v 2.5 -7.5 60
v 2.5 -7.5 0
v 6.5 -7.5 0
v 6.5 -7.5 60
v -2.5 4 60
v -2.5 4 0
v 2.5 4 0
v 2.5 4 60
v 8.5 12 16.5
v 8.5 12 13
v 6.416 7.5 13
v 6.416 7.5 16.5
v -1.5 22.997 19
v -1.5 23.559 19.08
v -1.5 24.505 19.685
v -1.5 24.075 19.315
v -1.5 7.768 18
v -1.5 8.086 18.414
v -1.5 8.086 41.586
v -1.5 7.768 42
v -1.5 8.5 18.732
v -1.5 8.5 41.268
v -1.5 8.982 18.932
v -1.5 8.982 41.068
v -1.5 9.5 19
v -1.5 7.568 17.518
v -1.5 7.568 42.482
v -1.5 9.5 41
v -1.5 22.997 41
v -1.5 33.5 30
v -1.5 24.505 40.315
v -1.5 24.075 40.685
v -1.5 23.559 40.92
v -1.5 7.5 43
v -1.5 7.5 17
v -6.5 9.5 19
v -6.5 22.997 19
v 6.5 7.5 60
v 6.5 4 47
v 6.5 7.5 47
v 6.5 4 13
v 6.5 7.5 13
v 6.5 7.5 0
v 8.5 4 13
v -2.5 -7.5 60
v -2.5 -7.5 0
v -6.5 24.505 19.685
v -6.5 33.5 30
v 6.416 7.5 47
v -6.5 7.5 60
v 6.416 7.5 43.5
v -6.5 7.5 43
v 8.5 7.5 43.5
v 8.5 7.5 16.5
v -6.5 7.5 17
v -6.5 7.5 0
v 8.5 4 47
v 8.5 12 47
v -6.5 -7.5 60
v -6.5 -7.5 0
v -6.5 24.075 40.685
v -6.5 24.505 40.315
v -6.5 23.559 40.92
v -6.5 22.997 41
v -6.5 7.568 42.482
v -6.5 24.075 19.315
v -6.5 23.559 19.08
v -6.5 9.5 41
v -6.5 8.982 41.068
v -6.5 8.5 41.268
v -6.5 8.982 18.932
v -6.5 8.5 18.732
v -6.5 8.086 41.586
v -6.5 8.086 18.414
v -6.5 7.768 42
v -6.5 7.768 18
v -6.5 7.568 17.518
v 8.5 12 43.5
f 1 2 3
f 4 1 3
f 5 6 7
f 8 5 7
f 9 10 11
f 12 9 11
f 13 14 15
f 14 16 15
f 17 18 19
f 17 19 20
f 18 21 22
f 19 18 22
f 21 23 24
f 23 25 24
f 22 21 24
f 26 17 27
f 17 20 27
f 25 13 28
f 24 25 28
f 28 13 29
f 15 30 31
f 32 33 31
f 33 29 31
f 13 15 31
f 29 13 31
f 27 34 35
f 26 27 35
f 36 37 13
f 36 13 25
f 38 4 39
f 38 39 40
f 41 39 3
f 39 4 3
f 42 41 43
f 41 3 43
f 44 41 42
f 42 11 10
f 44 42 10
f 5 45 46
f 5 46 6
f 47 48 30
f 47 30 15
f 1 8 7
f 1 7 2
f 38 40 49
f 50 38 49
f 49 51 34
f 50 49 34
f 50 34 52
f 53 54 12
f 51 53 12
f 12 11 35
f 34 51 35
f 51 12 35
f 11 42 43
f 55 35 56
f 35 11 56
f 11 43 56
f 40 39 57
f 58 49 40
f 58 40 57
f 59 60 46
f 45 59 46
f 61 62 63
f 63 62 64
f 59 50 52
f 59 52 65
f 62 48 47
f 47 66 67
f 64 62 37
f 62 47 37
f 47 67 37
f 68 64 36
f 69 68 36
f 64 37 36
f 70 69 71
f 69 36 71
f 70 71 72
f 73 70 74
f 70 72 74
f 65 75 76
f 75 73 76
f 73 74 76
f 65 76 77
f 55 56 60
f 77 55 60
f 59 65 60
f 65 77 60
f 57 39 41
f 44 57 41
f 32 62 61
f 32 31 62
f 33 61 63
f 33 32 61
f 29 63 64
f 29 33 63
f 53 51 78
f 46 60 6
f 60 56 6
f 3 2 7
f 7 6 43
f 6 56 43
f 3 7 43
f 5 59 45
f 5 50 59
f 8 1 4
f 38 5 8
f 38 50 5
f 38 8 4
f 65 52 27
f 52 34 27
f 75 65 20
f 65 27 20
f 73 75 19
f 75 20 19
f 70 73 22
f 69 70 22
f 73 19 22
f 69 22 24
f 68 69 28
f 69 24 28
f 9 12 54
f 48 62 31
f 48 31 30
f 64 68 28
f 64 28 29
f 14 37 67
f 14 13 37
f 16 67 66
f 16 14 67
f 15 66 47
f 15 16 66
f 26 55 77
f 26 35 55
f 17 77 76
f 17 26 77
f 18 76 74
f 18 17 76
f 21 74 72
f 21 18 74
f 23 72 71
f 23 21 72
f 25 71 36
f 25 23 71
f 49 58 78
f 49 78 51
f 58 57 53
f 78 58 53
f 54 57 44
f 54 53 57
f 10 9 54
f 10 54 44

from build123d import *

# Parameters (mm, degrees)
EXTRUDE_1_DEPTH = 60
EXTRUDE_2_DEPTH = 5
SKETCH_3_W      = 34
SKETCH_3_H      = 3.5
EXTRUDE_3_DEPTH = 2
EXTRUDE_4_DEPTH = 3.5
FILLET_1_R      = 2
FILLET_2_R      = 2
FILLET_3_R      = 2
FILLET_4_R      = 2


with BuildPart() as part:
    # 草图1 → 凸台-拉伸1 (new body)
    with BuildSketch(Plane.XY):
        Polygon((-6.5, -7.5), (-2.5, -7.5), (-2.5, 4), (2.5, 4), (2.5, -7.5), (6.5, -7.5), (6.5, 7.5), (-6.5, 7.5), align=None)
    extrude(amount=EXTRUDE_1_DEPTH)

    # 草图2 → 凸台-拉伸2 (add)
    with BuildSketch(Plane.ZY.offset(6.5)):
        Polygon((19, 7.5), (41, 7.5), (41, 23.906923686), (30, 33.5), (19, 23.906923686), align=None)
    extrude(amount=-EXTRUDE_2_DEPTH)

    # 草图3 → 凸台-拉伸3 (add)
    with BuildSketch(Plane(origin=(6.5, 0, 0), x_dir=(0, 0, -1), z_dir=(1, 0, 0))):
        with Locations((-30, 5.75)):
            Rectangle(SKETCH_3_W, SKETCH_3_H)
    extrude(amount=EXTRUDE_3_DEPTH)

    # 草图4 → 凸台-拉伸4 (add)
    with BuildSketch(Plane.XY.offset(47)):
        Polygon((8.5, 4), (8.5, 12), (4.795643232, 4), align=None)
    extrude_4 = extrude(amount=-EXTRUDE_4_DEPTH)

    # 镜向1: 凸台-拉伸4 across plane
    add(extrude_4.mirror(Plane.XY.offset(30)))

    # 圆角1
    fillet_1_edges = [part.edges().sort_by_distance(p)[0] for p in [
        (-4, 7.5, 41),
    ]]
    fillet(fillet_1_edges, radius=FILLET_1_R)

    # 圆角2
    fillet_2_edges = [part.edges().sort_by_distance(p)[0] for p in [
        (-4, 7.5, 19),
    ]]
    fillet(fillet_2_edges, radius=FILLET_2_R)

    # 圆角3
    fillet_3_edges = [part.edges().sort_by_distance(p)[0] for p in [
        (-4, 23.906923686, 19),
    ]]
    fillet(fillet_3_edges, radius=FILLET_3_R)

    # 圆角4
    fillet_4_edges = [part.edges().sort_by_distance(p)[0] for p in [
        (-4, 23.906923686, 41),
    ]]
    fillet(fillet_4_edges, radius=FILLET_4_R)


solid = part.part
